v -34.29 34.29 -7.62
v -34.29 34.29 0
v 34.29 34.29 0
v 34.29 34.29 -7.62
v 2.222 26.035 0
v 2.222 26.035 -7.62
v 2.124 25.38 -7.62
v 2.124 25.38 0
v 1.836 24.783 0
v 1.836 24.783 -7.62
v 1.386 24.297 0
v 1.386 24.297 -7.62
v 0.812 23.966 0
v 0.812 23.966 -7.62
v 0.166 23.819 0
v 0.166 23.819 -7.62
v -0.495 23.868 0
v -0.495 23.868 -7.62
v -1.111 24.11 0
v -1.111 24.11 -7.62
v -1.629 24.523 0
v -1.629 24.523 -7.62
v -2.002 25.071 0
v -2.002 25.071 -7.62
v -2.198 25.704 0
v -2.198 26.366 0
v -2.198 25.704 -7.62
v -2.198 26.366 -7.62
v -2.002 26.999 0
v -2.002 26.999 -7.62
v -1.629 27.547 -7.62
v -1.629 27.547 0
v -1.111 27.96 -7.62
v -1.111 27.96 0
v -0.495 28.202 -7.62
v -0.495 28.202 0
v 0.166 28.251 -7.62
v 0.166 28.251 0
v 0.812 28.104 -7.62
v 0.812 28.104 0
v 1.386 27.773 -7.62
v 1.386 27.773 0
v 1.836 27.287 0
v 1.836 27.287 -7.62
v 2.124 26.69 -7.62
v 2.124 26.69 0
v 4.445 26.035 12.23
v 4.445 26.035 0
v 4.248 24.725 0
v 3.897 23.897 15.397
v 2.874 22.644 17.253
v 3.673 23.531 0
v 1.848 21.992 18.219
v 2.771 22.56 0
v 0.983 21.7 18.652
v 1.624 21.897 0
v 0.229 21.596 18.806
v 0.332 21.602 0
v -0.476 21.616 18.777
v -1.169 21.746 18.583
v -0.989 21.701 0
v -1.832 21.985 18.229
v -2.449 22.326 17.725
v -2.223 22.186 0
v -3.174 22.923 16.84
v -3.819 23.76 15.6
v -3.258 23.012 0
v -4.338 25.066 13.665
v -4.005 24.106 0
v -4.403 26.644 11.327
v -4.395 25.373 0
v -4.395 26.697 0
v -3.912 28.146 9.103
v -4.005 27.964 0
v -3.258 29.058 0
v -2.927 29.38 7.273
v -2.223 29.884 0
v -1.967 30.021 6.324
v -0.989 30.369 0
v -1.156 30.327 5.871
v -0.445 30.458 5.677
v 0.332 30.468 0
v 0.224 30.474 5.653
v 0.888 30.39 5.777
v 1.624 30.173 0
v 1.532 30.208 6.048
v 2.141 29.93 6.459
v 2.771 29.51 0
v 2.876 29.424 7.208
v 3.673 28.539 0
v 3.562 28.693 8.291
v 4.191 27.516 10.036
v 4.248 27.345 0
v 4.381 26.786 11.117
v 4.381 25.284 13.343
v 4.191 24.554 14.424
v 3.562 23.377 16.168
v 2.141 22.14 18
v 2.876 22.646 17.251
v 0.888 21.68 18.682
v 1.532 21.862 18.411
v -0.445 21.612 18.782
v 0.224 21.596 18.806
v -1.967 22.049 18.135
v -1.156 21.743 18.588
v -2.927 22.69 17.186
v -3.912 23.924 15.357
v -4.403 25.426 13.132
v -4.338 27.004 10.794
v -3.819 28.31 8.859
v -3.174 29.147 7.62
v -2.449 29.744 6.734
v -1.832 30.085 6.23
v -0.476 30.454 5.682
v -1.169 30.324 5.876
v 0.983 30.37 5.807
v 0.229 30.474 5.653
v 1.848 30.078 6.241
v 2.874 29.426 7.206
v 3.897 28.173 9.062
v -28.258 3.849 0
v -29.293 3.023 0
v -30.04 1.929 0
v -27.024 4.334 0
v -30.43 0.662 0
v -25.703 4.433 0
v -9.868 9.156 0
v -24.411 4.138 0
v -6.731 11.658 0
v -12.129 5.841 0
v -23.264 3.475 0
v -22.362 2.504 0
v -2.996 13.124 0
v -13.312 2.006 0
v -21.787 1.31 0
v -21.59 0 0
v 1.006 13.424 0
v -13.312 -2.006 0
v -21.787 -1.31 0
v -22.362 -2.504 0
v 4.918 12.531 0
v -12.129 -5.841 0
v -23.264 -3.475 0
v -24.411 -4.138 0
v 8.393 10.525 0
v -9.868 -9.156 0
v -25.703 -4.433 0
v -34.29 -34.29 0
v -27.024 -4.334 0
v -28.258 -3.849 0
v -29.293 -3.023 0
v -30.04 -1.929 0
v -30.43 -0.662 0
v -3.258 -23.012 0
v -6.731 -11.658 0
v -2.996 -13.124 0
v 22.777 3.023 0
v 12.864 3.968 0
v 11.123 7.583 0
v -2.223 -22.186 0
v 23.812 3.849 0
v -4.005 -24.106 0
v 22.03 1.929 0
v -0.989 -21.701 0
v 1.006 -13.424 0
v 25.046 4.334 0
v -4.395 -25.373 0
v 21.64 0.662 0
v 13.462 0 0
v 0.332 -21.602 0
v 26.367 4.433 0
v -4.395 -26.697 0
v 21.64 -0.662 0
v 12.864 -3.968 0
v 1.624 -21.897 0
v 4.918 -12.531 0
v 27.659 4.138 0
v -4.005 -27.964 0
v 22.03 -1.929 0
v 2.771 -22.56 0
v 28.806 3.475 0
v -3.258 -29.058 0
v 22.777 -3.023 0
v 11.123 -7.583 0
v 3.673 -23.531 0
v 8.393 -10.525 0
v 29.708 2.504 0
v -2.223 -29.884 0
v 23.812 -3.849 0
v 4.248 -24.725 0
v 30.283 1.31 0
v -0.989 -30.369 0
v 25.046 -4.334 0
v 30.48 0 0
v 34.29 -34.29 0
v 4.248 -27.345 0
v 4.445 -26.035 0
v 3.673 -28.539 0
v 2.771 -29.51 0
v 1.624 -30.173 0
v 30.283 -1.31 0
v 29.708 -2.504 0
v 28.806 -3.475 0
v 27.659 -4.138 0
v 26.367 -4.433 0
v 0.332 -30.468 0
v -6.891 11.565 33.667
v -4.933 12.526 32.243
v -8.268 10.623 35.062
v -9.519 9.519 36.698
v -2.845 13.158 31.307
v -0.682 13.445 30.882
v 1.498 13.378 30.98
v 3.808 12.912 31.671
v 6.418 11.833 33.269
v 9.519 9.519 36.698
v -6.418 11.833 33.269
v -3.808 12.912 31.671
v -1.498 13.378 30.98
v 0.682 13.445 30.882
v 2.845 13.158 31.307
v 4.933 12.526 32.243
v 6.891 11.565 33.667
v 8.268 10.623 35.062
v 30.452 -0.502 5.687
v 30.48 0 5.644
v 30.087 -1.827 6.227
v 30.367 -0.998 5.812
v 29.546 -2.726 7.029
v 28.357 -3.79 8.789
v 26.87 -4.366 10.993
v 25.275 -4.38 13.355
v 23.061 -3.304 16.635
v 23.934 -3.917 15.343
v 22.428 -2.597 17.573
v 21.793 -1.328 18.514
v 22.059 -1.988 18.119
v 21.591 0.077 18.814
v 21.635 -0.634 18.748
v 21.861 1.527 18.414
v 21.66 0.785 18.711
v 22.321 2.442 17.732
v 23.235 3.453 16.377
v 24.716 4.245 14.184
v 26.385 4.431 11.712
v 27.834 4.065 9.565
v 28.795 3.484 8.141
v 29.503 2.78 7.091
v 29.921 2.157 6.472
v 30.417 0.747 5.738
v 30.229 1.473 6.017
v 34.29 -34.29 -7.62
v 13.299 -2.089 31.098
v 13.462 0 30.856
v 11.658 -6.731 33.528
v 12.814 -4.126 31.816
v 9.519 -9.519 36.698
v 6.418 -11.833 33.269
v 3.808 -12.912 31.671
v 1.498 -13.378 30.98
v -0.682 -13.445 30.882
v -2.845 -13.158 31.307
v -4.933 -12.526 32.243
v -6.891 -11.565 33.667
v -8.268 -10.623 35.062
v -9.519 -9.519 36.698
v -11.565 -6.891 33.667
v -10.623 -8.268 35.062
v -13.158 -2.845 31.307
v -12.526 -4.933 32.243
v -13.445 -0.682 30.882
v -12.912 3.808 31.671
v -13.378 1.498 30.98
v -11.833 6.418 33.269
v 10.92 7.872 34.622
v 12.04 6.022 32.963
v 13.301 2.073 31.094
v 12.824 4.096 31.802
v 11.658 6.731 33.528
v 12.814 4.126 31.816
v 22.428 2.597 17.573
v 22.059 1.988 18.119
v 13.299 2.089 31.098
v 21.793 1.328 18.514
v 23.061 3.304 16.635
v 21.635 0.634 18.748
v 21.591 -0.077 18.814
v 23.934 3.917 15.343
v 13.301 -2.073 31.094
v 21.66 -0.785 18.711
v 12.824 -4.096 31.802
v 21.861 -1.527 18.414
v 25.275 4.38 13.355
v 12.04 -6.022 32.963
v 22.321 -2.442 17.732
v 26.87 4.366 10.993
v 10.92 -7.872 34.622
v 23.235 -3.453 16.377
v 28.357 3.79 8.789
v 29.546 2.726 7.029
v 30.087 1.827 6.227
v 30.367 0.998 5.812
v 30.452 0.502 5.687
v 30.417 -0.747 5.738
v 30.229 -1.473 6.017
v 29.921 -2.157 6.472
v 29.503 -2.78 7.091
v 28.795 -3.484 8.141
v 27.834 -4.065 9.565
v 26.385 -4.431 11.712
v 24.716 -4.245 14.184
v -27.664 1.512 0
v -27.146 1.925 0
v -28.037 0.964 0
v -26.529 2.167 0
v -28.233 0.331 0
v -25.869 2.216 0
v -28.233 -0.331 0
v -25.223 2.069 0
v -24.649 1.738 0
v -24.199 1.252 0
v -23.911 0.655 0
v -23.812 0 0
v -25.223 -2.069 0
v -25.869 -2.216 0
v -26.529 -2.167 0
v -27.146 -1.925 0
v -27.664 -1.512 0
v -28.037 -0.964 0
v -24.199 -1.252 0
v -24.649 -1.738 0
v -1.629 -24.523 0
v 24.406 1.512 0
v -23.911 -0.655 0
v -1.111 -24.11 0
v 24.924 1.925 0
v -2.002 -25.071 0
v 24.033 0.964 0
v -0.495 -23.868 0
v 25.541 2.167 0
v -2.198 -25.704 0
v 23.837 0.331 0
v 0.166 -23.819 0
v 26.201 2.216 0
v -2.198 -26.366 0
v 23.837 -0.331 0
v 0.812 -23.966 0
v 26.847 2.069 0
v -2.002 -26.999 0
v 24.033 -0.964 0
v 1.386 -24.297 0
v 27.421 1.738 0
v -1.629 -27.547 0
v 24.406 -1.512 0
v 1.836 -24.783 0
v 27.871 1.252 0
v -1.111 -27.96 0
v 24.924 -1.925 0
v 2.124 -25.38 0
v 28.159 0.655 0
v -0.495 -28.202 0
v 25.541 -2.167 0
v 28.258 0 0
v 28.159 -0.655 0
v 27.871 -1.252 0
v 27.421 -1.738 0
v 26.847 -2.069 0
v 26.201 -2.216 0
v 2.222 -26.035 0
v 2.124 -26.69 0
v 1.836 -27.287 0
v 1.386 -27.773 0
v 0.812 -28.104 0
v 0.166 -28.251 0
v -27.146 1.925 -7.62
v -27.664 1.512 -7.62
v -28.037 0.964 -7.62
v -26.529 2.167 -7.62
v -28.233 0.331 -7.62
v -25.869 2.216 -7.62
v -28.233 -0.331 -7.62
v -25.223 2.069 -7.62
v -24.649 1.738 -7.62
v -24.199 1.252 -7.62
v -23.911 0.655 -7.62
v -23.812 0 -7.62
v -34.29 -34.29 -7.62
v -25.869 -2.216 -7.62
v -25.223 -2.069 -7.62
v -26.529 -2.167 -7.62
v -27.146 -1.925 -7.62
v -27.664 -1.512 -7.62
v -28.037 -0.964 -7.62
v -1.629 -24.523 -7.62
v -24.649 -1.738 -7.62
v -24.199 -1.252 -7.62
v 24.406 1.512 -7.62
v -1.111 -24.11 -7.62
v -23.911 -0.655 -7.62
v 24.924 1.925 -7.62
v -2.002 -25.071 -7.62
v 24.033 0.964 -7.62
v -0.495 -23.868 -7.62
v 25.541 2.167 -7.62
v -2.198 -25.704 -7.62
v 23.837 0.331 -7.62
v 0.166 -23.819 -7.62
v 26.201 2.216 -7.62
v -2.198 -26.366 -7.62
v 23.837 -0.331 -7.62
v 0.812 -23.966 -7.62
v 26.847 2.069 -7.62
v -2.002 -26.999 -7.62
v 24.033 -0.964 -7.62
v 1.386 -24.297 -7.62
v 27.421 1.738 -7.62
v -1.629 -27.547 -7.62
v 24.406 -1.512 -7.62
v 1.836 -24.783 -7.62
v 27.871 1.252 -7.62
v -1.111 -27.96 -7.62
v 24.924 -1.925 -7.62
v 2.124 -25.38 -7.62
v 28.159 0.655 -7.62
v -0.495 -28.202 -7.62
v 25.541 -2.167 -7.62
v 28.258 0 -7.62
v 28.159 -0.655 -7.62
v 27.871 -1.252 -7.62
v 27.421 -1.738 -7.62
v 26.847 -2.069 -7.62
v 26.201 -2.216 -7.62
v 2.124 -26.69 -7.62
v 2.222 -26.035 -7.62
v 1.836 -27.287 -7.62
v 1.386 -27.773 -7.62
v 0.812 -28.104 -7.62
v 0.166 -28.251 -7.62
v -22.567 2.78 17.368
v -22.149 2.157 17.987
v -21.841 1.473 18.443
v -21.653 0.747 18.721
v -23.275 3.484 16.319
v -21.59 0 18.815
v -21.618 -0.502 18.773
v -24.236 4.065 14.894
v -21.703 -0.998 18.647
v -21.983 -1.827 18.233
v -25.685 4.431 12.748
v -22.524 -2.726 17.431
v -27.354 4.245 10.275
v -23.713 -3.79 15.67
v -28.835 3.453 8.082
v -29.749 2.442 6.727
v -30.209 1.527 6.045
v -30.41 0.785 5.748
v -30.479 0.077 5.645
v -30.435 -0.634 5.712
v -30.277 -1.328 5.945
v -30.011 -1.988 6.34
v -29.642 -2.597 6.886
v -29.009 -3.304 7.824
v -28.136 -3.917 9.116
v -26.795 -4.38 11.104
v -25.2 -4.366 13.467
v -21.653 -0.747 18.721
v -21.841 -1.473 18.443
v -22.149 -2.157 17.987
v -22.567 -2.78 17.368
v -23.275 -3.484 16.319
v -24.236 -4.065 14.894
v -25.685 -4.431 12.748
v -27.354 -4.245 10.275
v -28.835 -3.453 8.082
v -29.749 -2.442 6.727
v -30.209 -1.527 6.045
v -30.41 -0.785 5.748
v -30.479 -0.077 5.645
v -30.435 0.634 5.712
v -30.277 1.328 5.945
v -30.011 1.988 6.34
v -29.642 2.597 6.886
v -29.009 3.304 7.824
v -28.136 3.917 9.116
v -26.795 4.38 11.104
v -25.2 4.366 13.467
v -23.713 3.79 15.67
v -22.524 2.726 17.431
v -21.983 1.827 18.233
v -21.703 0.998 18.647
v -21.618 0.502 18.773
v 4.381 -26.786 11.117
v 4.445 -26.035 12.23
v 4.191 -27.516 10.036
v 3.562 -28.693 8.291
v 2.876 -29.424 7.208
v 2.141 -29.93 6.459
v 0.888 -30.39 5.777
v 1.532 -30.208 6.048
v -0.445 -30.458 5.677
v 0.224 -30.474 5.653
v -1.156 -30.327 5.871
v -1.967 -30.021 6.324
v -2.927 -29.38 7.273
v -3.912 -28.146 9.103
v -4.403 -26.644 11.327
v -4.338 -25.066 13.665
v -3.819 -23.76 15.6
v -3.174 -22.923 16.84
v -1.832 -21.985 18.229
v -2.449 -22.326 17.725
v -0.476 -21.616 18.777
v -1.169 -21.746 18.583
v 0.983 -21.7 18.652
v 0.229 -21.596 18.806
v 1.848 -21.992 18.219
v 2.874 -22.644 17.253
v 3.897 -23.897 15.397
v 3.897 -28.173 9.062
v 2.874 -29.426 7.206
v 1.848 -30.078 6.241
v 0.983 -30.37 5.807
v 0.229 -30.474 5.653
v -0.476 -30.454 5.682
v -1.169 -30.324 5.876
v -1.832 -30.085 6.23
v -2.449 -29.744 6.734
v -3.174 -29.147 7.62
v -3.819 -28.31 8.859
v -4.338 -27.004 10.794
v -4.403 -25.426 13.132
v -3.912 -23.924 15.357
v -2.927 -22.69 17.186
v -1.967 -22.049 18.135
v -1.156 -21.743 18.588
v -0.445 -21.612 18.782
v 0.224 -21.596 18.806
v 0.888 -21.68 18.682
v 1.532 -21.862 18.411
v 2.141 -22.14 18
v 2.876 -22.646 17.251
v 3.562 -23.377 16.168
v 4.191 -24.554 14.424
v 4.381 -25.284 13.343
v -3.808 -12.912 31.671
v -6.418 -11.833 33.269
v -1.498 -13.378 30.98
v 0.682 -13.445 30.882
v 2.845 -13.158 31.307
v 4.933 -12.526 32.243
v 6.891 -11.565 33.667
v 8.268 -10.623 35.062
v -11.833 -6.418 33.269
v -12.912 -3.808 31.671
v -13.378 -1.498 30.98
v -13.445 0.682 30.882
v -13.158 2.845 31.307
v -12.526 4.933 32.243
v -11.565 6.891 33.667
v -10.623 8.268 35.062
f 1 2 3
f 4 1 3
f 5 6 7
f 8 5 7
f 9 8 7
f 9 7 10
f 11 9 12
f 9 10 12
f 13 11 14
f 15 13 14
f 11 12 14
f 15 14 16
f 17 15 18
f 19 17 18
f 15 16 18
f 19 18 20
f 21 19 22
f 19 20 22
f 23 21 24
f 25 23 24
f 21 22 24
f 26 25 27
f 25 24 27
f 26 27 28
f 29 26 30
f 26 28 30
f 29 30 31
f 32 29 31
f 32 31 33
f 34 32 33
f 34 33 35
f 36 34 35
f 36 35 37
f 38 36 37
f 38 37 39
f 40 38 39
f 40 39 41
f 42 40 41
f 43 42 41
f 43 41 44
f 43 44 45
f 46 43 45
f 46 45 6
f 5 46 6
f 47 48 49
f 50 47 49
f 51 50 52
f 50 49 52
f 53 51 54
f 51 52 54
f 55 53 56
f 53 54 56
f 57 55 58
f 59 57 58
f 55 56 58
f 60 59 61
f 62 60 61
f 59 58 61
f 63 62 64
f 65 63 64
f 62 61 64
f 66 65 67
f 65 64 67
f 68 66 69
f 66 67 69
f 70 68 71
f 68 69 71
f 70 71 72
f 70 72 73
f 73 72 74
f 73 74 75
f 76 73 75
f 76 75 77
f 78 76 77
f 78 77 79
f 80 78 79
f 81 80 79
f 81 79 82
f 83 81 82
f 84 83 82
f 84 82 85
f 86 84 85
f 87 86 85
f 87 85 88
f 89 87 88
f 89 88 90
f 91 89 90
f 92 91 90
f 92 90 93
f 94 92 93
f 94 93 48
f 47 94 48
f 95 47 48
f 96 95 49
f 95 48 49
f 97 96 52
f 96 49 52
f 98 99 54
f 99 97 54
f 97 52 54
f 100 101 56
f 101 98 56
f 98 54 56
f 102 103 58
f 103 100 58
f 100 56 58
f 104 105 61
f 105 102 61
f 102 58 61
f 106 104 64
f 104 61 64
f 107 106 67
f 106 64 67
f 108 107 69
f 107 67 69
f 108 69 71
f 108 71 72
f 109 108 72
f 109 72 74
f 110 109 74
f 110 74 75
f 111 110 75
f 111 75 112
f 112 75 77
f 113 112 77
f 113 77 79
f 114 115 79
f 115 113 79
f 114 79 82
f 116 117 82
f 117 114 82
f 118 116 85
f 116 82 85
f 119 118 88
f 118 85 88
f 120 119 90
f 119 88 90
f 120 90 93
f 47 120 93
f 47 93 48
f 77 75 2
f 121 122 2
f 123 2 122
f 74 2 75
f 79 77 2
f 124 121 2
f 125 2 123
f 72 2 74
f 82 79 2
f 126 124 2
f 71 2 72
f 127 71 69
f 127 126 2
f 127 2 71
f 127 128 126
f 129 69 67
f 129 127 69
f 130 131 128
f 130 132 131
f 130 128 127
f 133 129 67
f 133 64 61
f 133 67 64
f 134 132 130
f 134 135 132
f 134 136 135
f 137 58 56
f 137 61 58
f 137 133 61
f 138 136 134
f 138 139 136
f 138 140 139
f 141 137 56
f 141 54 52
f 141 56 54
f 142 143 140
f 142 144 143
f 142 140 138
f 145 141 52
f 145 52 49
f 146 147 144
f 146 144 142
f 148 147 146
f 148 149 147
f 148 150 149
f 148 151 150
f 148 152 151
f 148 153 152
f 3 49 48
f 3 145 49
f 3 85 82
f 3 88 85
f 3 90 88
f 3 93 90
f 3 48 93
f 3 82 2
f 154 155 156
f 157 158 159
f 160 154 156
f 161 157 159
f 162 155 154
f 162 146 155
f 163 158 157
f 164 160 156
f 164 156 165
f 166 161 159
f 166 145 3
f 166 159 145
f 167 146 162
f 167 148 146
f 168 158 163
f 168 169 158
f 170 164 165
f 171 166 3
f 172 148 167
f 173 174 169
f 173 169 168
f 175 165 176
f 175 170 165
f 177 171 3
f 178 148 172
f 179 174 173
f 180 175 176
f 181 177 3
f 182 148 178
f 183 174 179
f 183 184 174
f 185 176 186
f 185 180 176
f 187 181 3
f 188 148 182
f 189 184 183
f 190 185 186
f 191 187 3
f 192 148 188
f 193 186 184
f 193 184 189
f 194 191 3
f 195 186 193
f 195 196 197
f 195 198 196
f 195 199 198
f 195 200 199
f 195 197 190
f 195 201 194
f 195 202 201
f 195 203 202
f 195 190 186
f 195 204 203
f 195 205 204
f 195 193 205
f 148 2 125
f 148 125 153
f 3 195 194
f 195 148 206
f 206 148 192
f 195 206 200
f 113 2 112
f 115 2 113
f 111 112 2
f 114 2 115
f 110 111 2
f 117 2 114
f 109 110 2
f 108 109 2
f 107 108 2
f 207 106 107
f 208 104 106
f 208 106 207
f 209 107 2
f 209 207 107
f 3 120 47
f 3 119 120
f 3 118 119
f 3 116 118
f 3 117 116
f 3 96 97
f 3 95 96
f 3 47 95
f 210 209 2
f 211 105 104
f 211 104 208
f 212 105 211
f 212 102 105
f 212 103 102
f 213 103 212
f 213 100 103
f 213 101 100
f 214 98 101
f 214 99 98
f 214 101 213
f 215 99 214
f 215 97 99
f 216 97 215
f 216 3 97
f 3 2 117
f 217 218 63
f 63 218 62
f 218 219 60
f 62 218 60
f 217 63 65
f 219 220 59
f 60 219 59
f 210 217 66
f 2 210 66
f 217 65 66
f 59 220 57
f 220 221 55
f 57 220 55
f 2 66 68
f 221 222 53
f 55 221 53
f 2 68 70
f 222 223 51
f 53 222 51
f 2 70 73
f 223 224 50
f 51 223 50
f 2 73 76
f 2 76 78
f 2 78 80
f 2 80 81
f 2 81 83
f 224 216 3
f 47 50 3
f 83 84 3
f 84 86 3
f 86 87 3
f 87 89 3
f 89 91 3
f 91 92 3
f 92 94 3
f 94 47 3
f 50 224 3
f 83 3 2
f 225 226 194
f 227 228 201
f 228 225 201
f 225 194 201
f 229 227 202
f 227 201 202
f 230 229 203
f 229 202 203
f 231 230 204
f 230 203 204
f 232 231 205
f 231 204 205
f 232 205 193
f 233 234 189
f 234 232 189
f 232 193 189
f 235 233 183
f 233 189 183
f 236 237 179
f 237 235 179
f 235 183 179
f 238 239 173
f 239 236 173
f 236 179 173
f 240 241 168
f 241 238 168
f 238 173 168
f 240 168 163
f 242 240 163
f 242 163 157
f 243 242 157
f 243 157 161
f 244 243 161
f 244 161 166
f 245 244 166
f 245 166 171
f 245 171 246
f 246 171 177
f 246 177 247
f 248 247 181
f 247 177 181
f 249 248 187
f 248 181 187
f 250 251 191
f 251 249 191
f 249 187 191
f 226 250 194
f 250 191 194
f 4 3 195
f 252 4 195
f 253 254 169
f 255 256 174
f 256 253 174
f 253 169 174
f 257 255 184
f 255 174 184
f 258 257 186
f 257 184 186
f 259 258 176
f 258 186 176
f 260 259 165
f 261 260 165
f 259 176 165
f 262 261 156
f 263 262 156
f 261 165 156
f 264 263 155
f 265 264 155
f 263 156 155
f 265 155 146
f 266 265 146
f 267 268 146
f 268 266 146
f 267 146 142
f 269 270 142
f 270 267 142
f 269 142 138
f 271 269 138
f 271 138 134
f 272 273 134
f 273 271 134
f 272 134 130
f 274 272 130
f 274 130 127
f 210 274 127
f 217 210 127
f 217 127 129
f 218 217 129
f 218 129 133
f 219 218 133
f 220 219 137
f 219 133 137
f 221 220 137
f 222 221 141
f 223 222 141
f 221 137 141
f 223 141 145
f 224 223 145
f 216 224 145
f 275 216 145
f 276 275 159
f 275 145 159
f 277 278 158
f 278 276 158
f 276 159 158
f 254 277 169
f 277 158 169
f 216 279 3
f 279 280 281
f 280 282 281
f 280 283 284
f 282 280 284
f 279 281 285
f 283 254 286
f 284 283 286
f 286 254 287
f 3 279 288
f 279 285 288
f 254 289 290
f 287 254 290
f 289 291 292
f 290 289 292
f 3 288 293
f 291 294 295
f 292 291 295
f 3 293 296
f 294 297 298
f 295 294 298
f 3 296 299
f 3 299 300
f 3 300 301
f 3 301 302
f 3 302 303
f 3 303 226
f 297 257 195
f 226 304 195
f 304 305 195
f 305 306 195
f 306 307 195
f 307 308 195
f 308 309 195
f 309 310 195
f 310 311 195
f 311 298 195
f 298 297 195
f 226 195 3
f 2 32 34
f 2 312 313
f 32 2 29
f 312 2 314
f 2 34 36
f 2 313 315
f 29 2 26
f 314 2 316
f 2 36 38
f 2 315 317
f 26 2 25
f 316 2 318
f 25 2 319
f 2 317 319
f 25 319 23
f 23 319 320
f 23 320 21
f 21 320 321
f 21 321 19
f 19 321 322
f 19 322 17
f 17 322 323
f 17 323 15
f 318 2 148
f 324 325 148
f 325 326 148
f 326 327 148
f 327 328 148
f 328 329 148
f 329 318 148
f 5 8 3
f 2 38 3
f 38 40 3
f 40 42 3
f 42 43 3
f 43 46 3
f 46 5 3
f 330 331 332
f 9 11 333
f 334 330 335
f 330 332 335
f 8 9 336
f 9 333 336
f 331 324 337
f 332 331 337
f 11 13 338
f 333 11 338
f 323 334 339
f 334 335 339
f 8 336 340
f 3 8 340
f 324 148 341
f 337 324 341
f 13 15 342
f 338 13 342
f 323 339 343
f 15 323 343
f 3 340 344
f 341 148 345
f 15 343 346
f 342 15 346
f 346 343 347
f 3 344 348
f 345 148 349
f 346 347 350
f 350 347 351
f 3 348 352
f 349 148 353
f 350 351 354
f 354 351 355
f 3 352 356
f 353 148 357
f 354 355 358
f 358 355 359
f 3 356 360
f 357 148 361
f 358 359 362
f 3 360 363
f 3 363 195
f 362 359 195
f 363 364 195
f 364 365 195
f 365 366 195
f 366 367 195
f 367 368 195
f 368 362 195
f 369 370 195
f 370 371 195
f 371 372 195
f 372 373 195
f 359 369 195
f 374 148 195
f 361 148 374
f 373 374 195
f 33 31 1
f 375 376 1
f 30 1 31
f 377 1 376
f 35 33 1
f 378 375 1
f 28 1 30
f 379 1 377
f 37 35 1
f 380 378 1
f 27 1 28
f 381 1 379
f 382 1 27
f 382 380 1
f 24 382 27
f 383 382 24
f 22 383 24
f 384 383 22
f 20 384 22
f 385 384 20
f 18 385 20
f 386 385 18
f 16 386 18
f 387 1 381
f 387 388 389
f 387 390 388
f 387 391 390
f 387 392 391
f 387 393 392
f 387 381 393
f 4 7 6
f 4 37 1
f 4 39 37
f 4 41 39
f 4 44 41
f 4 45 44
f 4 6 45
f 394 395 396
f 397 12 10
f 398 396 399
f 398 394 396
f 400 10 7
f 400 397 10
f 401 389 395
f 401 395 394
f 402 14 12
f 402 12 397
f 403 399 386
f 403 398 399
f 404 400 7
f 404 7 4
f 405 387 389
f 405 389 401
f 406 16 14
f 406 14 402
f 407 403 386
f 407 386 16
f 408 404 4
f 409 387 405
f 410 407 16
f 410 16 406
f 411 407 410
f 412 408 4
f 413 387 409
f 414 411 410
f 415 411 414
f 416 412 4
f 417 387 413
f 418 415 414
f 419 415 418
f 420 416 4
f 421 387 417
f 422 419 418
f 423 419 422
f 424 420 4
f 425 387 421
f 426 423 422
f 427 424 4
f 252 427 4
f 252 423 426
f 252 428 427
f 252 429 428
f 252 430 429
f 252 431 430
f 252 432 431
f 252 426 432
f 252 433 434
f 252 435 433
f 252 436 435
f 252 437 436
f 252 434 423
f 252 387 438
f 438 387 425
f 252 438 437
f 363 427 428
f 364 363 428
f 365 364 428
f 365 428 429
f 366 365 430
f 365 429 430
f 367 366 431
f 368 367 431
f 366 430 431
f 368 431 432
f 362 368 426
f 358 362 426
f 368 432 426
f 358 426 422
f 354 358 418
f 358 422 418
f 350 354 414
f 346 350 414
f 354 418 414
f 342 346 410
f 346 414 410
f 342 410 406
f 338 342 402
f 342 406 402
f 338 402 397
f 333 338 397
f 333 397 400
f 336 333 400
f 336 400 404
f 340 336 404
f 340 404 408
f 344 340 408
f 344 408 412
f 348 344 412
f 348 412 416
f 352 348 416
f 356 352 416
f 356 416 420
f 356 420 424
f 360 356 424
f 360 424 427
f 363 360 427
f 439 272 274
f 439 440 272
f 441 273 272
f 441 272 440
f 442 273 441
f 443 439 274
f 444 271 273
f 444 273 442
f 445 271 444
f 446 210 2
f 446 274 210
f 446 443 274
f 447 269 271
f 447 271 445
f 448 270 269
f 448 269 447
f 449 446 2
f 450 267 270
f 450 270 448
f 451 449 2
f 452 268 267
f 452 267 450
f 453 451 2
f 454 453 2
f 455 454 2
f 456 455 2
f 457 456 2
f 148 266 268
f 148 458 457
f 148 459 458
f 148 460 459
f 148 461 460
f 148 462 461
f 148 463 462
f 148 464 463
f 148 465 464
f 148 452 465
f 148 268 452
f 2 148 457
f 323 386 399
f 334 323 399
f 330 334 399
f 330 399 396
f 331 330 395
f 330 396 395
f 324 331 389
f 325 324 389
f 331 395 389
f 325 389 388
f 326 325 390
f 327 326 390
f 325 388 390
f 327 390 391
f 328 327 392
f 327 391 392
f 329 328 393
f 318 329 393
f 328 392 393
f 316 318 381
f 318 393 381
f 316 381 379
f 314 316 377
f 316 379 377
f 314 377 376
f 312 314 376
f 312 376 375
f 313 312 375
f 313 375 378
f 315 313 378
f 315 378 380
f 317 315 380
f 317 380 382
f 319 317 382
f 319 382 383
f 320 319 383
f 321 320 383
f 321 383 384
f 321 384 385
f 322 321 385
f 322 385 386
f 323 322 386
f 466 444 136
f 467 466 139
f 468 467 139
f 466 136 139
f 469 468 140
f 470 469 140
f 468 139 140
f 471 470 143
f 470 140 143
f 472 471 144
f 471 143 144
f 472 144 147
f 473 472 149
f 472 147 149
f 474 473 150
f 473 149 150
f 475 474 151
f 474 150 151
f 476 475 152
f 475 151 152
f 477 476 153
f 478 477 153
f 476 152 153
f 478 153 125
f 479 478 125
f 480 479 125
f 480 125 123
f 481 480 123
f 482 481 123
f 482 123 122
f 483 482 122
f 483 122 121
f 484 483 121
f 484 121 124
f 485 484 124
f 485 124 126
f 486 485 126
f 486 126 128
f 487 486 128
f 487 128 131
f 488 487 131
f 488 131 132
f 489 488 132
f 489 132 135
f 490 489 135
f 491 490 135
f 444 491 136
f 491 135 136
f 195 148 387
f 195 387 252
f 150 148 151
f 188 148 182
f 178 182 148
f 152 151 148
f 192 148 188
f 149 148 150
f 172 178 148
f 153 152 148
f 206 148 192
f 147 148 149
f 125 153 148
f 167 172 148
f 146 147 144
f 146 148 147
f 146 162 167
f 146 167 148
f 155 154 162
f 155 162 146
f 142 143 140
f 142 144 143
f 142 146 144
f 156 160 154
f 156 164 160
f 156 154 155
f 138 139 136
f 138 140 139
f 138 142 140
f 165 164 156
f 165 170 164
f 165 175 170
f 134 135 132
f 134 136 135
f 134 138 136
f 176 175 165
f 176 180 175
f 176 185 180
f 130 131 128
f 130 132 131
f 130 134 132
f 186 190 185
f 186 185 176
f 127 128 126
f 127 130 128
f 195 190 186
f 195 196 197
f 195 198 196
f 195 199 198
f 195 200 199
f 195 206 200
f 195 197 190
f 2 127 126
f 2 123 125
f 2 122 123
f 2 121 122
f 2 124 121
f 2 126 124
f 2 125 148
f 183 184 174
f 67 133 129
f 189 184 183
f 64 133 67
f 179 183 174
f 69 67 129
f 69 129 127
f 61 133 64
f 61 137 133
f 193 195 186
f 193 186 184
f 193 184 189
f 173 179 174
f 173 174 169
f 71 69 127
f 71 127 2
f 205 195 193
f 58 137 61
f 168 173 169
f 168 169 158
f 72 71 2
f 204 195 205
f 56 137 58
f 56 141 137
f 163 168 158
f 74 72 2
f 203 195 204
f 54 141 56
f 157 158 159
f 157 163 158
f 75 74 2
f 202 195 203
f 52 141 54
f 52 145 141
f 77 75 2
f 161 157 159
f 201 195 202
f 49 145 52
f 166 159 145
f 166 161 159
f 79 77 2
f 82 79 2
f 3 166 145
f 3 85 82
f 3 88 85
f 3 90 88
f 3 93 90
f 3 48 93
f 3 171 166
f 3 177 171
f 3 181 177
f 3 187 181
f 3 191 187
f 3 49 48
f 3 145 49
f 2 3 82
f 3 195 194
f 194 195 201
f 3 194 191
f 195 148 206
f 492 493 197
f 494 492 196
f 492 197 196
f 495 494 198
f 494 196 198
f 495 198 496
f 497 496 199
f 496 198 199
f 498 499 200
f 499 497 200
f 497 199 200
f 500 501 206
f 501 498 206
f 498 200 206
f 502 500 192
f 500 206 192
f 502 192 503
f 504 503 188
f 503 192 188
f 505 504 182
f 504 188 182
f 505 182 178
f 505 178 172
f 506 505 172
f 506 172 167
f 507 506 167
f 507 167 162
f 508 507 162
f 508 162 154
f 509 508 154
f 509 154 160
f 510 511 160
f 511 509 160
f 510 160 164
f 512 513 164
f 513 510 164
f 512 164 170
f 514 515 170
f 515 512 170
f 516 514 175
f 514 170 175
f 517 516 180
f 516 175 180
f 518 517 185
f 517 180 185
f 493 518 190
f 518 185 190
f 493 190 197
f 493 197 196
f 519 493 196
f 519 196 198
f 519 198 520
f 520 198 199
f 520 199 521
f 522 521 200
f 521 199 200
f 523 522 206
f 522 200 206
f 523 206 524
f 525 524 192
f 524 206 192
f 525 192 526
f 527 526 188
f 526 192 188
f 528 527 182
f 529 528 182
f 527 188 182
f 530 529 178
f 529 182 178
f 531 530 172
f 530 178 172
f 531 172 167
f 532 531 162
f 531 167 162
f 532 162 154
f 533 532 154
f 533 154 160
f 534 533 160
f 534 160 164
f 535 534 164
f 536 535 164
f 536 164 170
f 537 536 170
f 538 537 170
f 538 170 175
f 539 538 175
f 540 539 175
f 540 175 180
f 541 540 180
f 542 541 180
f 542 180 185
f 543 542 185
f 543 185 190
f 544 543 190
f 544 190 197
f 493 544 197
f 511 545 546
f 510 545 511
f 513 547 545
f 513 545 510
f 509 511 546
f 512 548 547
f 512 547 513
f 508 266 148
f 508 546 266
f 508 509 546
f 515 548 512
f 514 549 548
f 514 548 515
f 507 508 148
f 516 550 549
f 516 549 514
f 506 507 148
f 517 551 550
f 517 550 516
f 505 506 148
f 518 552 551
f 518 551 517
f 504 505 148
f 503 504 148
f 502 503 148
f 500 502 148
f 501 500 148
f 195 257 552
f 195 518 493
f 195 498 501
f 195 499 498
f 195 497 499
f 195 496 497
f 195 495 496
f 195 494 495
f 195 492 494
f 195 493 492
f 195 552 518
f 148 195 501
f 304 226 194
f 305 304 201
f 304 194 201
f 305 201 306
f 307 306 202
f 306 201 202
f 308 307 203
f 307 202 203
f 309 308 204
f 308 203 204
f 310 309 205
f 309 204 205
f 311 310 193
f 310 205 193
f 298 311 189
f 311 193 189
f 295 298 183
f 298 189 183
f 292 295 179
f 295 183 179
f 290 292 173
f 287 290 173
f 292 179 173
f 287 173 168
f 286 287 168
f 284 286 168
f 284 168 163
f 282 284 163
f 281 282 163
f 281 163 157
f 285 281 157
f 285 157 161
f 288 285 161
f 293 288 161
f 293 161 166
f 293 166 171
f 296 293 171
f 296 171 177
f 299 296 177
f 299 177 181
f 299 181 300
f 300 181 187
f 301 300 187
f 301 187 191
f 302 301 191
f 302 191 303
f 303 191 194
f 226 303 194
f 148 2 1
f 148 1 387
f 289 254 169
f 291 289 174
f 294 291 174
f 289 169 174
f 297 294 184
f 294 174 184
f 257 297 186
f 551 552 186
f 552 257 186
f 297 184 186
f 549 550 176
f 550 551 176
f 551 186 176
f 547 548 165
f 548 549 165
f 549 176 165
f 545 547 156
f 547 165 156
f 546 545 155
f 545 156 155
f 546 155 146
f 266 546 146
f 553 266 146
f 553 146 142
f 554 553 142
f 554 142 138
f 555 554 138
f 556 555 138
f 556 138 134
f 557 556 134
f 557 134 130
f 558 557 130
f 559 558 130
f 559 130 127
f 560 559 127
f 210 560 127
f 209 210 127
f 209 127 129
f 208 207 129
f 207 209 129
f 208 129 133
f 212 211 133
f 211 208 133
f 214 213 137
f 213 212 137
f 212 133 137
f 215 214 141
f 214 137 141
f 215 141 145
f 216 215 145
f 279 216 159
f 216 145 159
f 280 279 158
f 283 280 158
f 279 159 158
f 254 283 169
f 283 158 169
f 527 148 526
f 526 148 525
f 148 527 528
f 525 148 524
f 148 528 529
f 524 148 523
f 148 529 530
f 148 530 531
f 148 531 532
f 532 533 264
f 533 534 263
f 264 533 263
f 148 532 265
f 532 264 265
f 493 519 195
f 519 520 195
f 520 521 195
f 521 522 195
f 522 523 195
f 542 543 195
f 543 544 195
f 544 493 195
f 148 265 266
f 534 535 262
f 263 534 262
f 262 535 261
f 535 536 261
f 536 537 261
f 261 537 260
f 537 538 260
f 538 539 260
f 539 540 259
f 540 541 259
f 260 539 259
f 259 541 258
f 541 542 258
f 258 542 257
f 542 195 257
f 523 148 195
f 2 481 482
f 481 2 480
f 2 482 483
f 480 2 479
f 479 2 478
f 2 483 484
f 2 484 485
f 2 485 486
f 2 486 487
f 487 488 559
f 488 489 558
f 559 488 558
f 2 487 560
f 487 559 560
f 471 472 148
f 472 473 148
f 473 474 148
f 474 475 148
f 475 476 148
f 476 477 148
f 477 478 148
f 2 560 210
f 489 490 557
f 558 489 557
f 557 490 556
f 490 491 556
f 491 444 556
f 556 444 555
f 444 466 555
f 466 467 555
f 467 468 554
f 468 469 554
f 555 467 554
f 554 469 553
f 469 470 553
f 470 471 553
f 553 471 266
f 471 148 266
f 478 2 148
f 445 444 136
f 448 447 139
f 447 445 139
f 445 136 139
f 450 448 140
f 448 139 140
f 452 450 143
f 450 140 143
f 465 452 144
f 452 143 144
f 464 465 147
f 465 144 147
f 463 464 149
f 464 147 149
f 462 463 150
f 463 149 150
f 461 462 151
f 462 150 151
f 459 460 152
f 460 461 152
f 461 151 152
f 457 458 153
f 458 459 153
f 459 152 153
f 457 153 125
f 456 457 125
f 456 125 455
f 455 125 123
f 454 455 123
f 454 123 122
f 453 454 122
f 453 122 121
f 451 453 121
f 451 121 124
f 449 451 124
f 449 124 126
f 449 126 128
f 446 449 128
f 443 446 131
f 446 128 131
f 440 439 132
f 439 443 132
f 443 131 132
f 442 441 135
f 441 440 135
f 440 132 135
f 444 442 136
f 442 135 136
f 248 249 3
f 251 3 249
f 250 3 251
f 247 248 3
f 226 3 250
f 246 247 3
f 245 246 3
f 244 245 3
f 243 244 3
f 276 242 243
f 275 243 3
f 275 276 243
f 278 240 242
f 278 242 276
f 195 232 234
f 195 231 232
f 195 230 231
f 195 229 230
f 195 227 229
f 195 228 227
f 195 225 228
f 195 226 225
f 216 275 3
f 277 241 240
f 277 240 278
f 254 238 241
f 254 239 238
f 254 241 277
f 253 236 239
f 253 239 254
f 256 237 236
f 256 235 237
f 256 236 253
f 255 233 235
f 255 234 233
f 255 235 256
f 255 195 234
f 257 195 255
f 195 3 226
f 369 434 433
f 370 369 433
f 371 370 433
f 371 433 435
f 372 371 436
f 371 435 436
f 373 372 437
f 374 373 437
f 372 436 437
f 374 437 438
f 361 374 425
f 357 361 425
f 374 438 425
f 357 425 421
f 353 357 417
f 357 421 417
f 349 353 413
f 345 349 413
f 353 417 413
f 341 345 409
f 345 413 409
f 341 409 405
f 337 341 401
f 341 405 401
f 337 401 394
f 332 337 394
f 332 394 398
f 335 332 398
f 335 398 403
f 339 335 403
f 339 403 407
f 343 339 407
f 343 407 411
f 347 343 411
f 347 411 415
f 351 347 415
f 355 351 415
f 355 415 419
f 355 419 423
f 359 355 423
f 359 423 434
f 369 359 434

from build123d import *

# Parameters (mm, degrees)
F1_DEPTH  = 34.29
F3_DEPTH  = 34.29
F5_DEPTH  = 38.1
F7_DEPTH  = 38.1
F9_DEPTH  = 38.1
F11_DEPTH = 38.1
F12_R     = 13.462
F13_DEPTH = 53.34
F14_R     = 4.445
F15_DEPTH = 22.86
F16_W     = 68.58
F16_H     = 68.58
F17_DEPTH = 7.62
F18_R     = 2.2225
F19_DEPTH = 12.7


with BuildPart() as f1:
    # F0 (on Front) → F1 (new body, symmetric)
    with BuildSketch(Plane.XZ):
        Polygon((0, 50.8), (-34.29, 0), (34.29, 0), align=None)
    extrude(amount=F1_DEPTH, both=True)

    # F8 (on Right) → F9 (cut, symmetric)
    with BuildSketch(Plane.YZ):
        Polygon((34.29, 50.8), (0, 50.8), (34.29, 0), align=None)
    extrude(amount=F9_DEPTH, both=True, mode=Mode.SUBTRACT)

    # F10 (on Right) → F11 (cut, symmetric)
    with BuildSketch(Plane.YZ):
        Polygon((-34.29, 0), (0, 50.8), (-34.29, 50.8), align=None)
    extrude(amount=F11_DEPTH, both=True, mode=Mode.SUBTRACT)


with BuildPart() as f3:
    # F2 (on Right) → F3 (new body, symmetric)
    with BuildSketch(Plane.YZ):
        Polygon((-34.29, 0), (34.29, 0), (0, 50.8), align=None)
    extrude(amount=F3_DEPTH, both=True)

    # F4 (on Front) → F5 (cut, symmetric)
    with BuildSketch(Plane.XZ):
        Polygon((-34.29, 0), (0, 50.8), (-34.29, 50.8), align=None)
    extrude(amount=F5_DEPTH, both=True, mode=Mode.SUBTRACT)

    # F6 (on Front) → F7 (cut, symmetric)
    with BuildSketch(Plane.XZ):
        Polygon((34.29, 50.8), (0, 50.8), (34.29, 0), align=None)
    extrude(amount=F7_DEPTH, both=True, mode=Mode.SUBTRACT)


with BuildPart() as f13_tool:
    # F12 (on face) → F13 (new body)
    with BuildSketch(Plane(origin=(0, 0, 0), x_dir=(1, 0, 0), z_dir=(0, 0, -1))):
        Circle(F12_R)
    extrude(amount=-F13_DEPTH)


with BuildPart() as f1_1:
    add(f1.part)

    # F13: cut by f13_tool
    add(f13_tool.part, mode=Mode.SUBTRACT)


with BuildPart() as f3_1:
    add(f3.part)

    # F13: cut by f13_tool
    add(f13_tool.part, mode=Mode.SUBTRACT)


with BuildPart() as f15_tool:
    # F14 (on face) → F15 (new body)
    with BuildSketch(Plane(origin=(0, 0, 0), x_dir=(1, 0, 0), z_dir=(0, 0, -1))):
        with Locations((0, 26.035)):
            Circle(F14_R)
        with Locations((26.035, 0)):
            Circle(F14_R)
        with Locations((0, -26.035)):
            Circle(F14_R)
        with Locations((-26.035, 0)):
            Circle(F14_R)
    extrude(amount=-F15_DEPTH)


with BuildPart() as f1_2:
    add(f1_1.part)

    # F15: cut by f15_tool
    add(f15_tool.part, mode=Mode.SUBTRACT)


with BuildPart() as f3_2:
    add(f3_1.part)

    # F15: cut by f15_tool
    add(f15_tool.part, mode=Mode.SUBTRACT)


with BuildPart() as f17:
    # F16 (on face) → F17 (new body)
    with BuildSketch(Plane(origin=(0, 0, 0), x_dir=(1, 0, 0), z_dir=(0, 0, -1))):
        Rectangle(F16_W, F16_H)
    extrude(amount=F17_DEPTH)

    # F18 (on face) → F19 (cut)
    with BuildSketch(Plane(origin=(0, 0, -7.62), x_dir=(1, 0, 0), z_dir=(0, 0, -1))):
        with Locations((0, 26.035049)):
            Circle(F18_R)
        with Locations((-26.034884, 0)):
            Circle(F18_R)
        with Locations((0, -26.034951)):
            Circle(F18_R)
        with Locations((26.035116, 0)):
            Circle(F18_R)
    extrude(amount=-F19_DEPTH, mode=Mode.SUBTRACT)


solid = Compound([f1_2.part, f3_2.part, f17.part])
